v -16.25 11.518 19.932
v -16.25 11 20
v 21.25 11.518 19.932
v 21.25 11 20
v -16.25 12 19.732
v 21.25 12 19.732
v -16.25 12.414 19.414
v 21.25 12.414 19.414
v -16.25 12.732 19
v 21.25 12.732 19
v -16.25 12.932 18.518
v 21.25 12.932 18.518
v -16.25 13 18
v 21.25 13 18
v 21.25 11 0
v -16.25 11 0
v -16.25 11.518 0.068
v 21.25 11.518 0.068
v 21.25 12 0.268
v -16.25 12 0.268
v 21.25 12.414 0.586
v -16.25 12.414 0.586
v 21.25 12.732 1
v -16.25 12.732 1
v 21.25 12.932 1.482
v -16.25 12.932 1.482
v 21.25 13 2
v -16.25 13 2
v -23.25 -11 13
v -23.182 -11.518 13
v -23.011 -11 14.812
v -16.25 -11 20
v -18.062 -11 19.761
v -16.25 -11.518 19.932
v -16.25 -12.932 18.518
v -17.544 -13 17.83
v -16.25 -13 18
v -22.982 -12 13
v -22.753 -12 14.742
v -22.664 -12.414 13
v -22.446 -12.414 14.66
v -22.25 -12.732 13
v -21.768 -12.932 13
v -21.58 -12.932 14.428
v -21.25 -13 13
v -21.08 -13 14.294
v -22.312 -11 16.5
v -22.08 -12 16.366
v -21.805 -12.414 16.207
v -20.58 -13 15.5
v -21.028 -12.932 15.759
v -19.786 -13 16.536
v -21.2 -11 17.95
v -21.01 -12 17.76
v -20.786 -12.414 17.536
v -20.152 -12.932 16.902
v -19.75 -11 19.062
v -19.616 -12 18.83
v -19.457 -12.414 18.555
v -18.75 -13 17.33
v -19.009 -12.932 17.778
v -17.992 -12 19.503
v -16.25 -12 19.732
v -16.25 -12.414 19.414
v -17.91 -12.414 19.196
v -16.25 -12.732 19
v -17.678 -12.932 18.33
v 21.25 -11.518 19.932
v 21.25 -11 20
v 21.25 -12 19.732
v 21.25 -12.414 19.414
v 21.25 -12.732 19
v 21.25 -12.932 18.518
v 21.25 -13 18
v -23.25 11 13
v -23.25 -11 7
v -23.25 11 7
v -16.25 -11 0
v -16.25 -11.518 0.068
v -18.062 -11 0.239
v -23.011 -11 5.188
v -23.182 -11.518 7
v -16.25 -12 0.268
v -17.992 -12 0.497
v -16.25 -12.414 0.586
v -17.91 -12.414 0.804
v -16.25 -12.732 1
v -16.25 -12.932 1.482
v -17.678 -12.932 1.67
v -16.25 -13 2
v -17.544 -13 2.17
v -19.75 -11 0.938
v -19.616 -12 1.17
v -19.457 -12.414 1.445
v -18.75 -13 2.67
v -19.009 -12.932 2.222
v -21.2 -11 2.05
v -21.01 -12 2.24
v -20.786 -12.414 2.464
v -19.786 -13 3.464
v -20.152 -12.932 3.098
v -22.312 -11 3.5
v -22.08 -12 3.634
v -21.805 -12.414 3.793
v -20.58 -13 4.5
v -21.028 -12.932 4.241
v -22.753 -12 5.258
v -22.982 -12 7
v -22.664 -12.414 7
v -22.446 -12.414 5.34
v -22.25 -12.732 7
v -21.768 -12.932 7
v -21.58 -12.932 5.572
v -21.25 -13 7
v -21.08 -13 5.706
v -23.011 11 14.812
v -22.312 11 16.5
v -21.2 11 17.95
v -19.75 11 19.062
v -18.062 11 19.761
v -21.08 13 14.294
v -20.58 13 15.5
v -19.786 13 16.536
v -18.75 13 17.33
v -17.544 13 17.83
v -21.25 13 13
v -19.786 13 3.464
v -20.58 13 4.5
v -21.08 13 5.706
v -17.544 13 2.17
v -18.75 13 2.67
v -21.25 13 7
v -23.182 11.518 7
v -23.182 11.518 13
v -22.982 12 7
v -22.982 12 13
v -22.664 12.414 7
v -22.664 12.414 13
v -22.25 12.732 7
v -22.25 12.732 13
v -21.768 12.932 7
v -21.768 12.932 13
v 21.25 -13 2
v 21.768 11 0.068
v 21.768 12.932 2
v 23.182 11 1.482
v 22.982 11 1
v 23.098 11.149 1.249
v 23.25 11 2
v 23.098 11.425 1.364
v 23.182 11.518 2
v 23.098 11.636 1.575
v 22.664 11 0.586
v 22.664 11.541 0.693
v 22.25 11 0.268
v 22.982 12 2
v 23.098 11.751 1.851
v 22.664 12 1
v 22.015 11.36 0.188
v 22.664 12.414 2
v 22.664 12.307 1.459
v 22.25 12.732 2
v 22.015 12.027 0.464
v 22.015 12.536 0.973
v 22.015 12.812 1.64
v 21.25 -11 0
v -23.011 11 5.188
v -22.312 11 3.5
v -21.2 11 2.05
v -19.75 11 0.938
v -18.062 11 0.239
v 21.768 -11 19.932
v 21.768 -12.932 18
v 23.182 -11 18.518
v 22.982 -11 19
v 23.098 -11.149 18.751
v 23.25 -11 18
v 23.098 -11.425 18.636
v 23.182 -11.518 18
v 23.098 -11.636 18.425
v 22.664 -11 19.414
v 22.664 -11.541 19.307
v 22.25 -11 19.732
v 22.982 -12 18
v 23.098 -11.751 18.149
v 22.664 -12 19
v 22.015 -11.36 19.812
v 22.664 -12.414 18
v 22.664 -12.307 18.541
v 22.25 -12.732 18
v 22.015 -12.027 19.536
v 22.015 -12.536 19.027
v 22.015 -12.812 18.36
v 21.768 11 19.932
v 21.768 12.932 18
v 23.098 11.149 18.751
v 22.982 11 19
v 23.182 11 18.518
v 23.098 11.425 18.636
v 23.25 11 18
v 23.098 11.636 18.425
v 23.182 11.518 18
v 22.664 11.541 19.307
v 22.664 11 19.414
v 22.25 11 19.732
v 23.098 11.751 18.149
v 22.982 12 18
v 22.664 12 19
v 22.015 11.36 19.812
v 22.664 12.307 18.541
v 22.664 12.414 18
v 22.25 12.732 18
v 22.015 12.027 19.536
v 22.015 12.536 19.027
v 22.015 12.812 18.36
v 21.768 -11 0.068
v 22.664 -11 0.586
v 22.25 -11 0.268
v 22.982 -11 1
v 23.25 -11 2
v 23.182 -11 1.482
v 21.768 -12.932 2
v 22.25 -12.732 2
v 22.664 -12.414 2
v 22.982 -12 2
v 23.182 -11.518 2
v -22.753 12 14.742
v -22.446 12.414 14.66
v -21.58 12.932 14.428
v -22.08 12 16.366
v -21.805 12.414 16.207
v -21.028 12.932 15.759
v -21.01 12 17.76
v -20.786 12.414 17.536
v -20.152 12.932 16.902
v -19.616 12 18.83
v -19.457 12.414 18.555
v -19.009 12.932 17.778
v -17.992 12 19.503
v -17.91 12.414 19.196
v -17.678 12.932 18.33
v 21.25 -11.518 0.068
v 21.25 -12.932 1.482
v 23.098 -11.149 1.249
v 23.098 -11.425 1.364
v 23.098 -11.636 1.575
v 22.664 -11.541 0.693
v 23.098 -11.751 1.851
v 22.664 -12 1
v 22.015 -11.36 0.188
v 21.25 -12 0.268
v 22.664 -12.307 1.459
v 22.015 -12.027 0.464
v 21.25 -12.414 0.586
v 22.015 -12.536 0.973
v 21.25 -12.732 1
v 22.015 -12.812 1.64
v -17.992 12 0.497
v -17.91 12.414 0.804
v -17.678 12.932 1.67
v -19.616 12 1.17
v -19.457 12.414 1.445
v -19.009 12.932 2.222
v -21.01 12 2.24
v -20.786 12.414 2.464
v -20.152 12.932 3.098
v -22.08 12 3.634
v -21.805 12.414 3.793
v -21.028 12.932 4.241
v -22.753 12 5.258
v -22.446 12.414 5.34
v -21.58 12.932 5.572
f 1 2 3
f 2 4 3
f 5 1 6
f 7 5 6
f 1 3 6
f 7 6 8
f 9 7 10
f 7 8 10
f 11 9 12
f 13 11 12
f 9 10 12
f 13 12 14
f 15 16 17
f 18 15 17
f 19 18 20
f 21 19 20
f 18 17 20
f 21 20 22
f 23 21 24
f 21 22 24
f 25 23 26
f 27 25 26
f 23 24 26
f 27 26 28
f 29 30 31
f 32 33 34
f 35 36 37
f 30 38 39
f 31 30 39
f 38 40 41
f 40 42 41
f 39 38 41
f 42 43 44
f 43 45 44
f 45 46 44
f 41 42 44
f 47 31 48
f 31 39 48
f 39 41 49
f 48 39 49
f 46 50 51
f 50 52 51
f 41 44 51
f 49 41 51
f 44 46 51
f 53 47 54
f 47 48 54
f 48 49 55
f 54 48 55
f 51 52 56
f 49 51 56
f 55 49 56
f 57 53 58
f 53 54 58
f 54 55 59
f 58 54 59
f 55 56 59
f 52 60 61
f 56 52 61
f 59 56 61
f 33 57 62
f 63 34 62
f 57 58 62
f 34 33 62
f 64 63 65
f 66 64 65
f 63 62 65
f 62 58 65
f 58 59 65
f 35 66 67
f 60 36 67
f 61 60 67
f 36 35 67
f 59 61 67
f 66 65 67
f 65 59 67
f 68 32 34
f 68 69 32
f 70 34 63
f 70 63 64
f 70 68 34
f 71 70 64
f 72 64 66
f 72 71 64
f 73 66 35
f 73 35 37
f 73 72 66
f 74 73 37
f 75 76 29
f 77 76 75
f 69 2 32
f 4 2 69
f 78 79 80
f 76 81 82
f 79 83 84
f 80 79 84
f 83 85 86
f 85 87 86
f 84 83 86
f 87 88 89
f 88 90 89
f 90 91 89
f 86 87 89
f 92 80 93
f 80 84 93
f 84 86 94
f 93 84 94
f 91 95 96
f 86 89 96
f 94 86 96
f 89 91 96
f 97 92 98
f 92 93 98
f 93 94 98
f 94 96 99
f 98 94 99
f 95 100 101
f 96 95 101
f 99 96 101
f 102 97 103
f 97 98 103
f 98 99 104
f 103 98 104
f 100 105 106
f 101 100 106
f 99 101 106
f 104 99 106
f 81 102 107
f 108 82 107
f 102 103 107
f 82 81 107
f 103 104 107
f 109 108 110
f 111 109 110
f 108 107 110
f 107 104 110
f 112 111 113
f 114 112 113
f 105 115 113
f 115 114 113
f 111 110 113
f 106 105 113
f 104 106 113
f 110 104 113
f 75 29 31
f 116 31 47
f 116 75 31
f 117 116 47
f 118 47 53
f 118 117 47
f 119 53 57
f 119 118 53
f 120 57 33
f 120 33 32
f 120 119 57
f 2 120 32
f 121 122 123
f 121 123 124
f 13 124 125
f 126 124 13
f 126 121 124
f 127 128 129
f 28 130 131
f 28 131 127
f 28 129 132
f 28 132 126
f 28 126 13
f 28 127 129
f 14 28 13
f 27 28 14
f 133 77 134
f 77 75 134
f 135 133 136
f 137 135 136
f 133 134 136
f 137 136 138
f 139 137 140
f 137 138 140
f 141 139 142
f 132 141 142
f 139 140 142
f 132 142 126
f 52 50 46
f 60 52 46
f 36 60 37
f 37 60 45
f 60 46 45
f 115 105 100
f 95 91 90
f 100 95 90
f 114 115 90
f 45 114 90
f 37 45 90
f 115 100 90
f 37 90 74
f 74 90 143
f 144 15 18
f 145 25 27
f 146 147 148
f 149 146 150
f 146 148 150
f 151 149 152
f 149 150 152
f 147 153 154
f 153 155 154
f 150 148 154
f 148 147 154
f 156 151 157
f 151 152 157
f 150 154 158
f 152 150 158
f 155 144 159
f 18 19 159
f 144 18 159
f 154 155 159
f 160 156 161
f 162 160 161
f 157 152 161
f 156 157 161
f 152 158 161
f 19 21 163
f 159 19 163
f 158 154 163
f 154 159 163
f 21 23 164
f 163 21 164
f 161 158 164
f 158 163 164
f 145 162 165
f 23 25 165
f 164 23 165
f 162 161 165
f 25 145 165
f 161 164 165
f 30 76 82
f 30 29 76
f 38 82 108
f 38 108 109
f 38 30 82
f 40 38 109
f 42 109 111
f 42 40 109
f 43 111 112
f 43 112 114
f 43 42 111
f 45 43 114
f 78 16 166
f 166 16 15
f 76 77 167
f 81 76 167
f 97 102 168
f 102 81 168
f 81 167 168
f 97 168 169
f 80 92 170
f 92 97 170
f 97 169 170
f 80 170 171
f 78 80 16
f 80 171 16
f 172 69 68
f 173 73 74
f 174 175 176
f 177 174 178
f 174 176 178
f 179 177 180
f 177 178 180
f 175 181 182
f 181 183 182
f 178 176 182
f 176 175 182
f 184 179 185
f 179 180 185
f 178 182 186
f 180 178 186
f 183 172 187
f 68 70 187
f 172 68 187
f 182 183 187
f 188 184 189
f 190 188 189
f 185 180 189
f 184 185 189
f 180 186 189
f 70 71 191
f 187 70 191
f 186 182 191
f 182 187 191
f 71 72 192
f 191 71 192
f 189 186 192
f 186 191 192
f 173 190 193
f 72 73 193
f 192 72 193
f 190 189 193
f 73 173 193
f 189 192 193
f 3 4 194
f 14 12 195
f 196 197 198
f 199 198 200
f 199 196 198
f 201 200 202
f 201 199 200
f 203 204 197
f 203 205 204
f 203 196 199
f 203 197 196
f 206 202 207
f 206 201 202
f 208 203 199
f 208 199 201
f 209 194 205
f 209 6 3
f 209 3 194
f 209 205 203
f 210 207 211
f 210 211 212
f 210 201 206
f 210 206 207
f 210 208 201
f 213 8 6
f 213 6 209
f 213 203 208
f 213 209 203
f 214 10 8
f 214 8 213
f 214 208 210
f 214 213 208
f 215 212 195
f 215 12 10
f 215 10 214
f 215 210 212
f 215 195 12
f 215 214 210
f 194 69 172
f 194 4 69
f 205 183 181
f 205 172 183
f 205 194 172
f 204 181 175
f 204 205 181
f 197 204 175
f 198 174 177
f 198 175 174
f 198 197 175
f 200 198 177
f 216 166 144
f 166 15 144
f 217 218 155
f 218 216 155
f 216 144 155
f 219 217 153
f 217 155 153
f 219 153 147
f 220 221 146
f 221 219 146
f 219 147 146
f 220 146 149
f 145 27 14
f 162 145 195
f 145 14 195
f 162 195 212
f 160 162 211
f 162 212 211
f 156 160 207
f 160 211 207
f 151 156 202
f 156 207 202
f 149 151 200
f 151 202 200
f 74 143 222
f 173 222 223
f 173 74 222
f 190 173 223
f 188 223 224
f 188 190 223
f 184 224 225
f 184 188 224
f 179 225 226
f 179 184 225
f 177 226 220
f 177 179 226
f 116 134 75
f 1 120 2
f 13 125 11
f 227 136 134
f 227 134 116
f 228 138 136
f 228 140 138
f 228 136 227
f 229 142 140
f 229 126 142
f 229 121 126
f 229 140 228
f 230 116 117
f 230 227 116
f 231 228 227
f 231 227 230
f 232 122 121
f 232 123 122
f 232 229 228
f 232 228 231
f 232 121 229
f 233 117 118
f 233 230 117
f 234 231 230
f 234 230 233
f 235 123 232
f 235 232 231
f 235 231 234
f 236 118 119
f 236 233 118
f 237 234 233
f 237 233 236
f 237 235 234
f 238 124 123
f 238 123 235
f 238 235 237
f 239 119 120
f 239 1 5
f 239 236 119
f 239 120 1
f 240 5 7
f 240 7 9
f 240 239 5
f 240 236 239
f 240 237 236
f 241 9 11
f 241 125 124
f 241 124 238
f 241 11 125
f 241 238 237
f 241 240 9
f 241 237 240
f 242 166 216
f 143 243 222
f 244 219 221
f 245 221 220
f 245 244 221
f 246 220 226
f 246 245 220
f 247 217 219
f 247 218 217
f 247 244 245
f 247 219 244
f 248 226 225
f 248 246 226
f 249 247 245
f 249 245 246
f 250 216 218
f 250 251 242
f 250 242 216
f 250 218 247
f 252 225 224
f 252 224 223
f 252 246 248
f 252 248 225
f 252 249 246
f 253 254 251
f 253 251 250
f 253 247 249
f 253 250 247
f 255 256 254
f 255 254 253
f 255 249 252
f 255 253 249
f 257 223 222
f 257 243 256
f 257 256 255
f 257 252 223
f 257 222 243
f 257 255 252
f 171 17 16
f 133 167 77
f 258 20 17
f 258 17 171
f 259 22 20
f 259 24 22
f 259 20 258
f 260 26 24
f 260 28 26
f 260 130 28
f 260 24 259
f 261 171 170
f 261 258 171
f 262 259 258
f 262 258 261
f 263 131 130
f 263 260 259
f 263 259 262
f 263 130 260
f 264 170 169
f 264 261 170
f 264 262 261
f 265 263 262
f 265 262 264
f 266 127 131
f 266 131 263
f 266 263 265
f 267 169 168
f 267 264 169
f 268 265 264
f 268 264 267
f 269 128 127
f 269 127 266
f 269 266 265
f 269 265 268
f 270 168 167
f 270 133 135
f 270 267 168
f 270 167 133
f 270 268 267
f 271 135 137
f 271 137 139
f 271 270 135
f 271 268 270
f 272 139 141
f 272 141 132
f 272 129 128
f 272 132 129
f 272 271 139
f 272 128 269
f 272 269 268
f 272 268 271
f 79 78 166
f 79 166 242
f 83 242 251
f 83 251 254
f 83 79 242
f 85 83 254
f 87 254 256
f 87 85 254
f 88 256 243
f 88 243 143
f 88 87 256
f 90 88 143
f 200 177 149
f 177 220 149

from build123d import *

# Parameters (mm, degrees)
SKETCH1_W           = 46.5
SKETCH1_H           = 26
BOSS_EXTRUDE1_DEPTH = 20
FILLET1_R           = 7
FILLET2_R           = 2


with BuildPart() as part:
    # Sketch1 → Boss-Extrude1 (new body)
    with BuildSketch(Plane.XY):
        Rectangle(SKETCH1_W, SKETCH1_H)
    extrude(amount=BOSS_EXTRUDE1_DEPTH)

    # Fillet1
    fillet1_edges = [part.edges().sort_by_distance(p)[0] for p in [
        (-23.25, 0, 20),
        (-23.25, 0, 0),
    ]]
    fillet(fillet1_edges, radius=FILLET1_R)

    # Fillet2
    fillet2_edges = [part.edges().sort_by_distance(p)[0] for p in [
        (-23.25, -13, 10),
        (-23.25, 13, 10),
        (3.5, -13, 0),
        (3.5, -13, 20),
        (-21.199747468, -13, 17.949747468),
        (-21.199747468, -13, 2.050252532),
        (-21.199747468, 13, 17.949747468),
        (-21.199747468, 13, 2.050252532),
        (23.25, 0, 20),
        (3.5, 13, 0),
        (23.25, 0, 0),
        (23.25, -13, 10),
        (23.25, 13, 10),
        (3.5, 13, 20),
    ]]
    fillet(fillet2_edges, radius=FILLET2_R)


solid = part.part
